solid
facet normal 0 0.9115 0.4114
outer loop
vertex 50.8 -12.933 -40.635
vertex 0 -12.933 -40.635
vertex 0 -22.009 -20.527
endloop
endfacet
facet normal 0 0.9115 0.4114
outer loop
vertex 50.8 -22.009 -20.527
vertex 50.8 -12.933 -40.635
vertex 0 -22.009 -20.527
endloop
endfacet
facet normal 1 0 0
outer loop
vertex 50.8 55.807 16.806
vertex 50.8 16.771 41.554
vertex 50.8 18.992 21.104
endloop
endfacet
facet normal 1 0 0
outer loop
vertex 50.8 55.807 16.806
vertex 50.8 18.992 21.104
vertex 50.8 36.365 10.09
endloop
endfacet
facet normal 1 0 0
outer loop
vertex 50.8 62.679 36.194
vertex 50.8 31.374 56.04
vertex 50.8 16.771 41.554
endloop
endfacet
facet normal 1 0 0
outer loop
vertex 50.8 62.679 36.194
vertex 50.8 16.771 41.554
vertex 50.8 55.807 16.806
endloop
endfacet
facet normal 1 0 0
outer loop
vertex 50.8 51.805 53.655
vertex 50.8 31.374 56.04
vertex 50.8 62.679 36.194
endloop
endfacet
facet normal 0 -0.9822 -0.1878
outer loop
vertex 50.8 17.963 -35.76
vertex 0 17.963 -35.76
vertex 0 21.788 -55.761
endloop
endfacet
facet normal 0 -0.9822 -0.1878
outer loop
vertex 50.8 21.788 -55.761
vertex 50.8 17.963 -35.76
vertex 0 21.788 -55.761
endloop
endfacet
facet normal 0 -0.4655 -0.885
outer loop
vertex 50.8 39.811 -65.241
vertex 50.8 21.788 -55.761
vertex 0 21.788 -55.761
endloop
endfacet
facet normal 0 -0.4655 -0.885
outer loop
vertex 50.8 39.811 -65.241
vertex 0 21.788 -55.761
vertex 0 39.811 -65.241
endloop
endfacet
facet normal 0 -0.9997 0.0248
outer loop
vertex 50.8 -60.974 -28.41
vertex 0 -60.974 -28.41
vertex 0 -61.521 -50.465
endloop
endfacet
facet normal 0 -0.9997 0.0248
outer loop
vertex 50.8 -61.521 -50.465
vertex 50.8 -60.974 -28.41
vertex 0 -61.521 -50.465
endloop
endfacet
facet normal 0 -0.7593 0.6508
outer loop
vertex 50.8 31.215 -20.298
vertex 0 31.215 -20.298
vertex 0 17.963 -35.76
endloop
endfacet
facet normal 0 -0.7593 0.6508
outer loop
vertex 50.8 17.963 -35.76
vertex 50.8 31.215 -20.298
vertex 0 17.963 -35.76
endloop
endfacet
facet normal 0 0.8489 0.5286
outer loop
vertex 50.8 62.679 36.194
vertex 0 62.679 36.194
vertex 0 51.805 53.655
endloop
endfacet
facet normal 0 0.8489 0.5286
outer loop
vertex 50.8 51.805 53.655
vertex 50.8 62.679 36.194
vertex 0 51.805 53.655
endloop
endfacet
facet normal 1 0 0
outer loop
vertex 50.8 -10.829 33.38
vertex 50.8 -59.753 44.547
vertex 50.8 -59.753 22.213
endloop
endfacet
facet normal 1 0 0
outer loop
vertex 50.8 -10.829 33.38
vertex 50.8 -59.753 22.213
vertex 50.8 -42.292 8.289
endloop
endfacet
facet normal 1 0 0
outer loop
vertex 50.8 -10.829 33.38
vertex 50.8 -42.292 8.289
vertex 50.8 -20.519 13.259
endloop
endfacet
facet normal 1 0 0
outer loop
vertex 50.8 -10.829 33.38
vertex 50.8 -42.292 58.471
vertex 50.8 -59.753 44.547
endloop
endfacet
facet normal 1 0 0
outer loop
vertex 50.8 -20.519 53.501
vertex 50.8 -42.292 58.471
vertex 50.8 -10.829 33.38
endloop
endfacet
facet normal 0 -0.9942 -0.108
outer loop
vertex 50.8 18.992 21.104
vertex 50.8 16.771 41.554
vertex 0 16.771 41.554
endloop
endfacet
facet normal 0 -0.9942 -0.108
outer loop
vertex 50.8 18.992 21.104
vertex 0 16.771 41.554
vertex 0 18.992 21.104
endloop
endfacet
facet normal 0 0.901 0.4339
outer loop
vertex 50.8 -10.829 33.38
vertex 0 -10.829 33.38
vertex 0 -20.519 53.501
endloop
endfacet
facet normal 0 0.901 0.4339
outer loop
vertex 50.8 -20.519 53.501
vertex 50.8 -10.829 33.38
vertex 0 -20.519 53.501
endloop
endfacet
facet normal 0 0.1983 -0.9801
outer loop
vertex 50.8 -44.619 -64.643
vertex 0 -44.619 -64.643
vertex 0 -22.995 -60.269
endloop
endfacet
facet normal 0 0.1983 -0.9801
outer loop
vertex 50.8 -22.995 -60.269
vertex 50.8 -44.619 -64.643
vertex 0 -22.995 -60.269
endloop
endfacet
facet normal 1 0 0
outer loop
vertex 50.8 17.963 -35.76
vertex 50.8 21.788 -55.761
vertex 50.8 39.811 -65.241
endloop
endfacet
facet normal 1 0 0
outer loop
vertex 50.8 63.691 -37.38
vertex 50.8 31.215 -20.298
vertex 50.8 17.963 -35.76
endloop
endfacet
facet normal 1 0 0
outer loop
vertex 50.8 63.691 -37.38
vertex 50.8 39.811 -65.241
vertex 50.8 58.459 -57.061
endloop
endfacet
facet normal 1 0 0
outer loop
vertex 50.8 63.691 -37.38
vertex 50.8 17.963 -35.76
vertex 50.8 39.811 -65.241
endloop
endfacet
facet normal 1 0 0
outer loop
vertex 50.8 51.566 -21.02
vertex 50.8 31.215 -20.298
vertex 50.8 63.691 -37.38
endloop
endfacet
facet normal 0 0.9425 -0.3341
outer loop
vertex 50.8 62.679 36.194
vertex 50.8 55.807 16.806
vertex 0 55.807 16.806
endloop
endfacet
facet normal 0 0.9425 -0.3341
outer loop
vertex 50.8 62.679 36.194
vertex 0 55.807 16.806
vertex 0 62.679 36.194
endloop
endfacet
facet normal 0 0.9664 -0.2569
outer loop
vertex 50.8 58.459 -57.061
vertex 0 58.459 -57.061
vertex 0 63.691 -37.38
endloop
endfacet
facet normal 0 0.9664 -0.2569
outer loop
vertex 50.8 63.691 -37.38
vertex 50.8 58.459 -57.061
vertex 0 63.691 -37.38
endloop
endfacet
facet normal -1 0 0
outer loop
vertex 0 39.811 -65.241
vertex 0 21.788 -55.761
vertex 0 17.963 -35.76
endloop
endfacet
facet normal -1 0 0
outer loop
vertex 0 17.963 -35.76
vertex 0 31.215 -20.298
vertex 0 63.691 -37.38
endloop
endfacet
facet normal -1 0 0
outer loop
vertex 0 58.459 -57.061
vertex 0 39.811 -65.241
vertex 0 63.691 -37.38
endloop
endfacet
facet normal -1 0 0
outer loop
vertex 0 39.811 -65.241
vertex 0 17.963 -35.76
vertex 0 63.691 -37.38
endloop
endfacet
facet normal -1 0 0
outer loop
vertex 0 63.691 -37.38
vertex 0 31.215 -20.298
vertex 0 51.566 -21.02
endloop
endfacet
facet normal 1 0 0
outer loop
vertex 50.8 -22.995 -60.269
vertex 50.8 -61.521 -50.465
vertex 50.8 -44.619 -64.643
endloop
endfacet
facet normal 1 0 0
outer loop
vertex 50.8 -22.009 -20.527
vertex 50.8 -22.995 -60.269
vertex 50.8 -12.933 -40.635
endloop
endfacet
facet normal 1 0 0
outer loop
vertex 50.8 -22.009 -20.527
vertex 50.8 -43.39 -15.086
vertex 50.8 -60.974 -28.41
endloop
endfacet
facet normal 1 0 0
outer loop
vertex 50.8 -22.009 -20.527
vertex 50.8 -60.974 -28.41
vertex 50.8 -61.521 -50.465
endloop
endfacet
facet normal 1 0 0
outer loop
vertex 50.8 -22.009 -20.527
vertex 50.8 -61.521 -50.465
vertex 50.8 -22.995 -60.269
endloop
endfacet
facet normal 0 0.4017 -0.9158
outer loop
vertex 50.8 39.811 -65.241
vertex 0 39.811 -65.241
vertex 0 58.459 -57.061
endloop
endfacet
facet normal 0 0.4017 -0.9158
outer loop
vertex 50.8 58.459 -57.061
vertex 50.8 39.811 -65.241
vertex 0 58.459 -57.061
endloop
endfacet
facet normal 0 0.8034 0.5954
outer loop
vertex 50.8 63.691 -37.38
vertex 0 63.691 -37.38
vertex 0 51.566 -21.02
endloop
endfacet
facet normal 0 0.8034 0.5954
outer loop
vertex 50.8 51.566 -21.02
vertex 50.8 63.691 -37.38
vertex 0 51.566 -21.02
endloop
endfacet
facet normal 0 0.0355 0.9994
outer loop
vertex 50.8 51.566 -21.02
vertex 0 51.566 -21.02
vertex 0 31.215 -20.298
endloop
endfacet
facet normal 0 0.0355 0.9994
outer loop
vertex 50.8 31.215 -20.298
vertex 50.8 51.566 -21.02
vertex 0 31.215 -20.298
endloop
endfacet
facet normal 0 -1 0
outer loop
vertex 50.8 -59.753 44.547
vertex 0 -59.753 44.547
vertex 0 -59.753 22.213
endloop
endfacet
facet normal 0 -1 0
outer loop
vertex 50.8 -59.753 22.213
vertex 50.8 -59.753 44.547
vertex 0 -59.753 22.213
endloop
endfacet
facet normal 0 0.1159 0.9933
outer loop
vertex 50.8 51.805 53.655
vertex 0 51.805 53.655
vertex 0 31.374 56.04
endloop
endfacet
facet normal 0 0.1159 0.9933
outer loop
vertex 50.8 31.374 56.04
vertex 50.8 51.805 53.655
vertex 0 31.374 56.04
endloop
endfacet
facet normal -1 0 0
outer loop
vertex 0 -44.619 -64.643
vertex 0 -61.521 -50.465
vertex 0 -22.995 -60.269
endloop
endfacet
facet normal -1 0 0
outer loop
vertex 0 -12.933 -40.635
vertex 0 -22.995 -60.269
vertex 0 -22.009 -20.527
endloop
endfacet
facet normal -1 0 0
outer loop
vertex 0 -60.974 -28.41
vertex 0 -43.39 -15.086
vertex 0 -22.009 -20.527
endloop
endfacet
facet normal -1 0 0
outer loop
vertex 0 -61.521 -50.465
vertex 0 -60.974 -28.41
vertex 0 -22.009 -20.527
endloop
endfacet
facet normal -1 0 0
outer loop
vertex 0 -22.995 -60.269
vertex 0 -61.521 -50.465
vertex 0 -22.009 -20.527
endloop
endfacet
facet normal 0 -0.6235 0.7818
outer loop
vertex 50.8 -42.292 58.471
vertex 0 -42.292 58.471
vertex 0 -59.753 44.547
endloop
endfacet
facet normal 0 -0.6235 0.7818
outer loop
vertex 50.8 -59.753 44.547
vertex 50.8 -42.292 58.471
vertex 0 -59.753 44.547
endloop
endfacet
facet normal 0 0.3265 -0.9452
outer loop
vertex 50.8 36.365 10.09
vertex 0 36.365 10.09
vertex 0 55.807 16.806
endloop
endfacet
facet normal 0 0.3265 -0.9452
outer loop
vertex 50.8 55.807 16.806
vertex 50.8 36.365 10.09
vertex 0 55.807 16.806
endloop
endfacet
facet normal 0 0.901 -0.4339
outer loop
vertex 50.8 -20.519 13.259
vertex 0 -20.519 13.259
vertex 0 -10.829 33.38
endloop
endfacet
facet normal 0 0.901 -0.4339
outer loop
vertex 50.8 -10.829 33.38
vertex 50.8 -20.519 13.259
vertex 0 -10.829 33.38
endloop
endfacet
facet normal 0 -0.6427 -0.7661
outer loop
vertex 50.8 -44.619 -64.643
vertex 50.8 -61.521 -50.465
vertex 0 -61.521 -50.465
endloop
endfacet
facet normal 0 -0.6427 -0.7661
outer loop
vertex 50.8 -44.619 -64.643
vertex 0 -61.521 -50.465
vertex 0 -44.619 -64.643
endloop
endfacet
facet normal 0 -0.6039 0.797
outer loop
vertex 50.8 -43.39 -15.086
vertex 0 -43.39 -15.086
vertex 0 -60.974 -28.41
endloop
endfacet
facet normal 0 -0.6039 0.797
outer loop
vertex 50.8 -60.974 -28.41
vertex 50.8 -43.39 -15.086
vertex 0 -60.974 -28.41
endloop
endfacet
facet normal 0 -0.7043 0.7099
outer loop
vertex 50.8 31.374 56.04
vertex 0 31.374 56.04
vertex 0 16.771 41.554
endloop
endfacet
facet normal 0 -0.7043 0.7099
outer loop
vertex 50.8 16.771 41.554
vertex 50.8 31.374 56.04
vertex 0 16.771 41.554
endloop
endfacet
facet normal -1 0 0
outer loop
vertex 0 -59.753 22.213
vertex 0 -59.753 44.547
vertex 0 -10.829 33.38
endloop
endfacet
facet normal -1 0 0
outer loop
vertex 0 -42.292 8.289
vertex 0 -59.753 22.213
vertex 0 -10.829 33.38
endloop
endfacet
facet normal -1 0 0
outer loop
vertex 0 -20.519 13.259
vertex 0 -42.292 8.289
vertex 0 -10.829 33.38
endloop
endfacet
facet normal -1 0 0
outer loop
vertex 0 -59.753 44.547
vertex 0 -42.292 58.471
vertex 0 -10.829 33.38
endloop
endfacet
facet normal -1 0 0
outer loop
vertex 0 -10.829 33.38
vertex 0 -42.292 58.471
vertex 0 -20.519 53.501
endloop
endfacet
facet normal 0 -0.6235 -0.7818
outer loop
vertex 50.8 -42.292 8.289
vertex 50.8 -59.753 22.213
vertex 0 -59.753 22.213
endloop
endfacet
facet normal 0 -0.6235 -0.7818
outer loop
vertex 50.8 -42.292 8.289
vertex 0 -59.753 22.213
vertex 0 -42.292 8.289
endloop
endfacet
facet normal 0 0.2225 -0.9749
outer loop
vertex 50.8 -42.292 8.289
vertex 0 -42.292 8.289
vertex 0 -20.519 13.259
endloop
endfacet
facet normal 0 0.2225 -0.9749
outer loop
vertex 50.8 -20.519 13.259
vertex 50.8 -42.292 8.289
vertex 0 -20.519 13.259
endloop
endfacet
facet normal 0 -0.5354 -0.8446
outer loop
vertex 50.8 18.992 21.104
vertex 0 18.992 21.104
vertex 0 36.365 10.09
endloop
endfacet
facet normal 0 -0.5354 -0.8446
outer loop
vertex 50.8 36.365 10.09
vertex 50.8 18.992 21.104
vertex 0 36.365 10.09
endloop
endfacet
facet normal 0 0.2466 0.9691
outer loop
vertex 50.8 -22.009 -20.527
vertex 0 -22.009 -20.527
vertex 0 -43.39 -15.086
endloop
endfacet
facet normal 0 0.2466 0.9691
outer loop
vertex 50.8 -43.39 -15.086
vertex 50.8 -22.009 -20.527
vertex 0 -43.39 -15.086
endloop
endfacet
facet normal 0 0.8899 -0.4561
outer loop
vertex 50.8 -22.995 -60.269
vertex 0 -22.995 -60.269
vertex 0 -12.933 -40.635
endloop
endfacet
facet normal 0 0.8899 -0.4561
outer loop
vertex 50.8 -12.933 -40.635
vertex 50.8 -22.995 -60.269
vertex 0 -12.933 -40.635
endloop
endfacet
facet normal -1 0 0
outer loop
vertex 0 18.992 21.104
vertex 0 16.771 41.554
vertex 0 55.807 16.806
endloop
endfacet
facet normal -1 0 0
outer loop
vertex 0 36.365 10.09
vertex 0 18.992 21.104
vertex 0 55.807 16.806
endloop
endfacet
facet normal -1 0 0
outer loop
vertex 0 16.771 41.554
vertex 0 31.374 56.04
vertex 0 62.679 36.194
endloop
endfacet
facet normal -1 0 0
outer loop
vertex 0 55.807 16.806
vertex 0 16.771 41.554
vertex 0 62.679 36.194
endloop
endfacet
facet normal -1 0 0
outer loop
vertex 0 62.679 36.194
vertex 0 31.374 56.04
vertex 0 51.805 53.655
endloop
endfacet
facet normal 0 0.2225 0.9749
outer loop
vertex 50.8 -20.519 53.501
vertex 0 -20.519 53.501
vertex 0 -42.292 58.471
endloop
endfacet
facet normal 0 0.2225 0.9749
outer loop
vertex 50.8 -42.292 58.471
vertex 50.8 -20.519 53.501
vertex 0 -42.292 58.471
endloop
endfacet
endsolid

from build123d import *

# Parameters (mm, degrees)
F2_DEPTH = 50.8


with BuildPart() as f2:
    # F0 (on Right) → F2 (new body)
    with BuildSketch(Plane.YZ):
        Polygon((-59.752692, 44.546535), (-59.752692, 22.213401), (-42.291945, 8.28892), (-20.518749, 13.25851), (-10.828766, 33.379968), (-20.518749, 53.501426), (-42.291945, 58.471016), align=None)
        Polygon((-22.995118, -60.26893), (-12.932937, -40.635408), (-22.009376, -20.527178), (-43.38969, -15.086147), (-60.974067, -28.409522), (-61.521113, -50.46453), (-44.618891, -64.643301), align=None)
        Polygon((31.215376, -20.298284), (17.962751, -35.759676), (21.788077, -55.761016), (39.810807, -65.240887), (58.459456, -57.060753), (63.691212, -37.380421), (51.566456, -21.019583), align=None)
        Polygon((55.807209, 16.806075), (62.678942, 36.194181), (51.805166, 53.655004), (31.374056, 56.040188), (16.770656, 41.553642), (18.991622, 21.10403), (36.364523, 10.090326), align=None)
    extrude(amount=F2_DEPTH)


solid = f2.part
